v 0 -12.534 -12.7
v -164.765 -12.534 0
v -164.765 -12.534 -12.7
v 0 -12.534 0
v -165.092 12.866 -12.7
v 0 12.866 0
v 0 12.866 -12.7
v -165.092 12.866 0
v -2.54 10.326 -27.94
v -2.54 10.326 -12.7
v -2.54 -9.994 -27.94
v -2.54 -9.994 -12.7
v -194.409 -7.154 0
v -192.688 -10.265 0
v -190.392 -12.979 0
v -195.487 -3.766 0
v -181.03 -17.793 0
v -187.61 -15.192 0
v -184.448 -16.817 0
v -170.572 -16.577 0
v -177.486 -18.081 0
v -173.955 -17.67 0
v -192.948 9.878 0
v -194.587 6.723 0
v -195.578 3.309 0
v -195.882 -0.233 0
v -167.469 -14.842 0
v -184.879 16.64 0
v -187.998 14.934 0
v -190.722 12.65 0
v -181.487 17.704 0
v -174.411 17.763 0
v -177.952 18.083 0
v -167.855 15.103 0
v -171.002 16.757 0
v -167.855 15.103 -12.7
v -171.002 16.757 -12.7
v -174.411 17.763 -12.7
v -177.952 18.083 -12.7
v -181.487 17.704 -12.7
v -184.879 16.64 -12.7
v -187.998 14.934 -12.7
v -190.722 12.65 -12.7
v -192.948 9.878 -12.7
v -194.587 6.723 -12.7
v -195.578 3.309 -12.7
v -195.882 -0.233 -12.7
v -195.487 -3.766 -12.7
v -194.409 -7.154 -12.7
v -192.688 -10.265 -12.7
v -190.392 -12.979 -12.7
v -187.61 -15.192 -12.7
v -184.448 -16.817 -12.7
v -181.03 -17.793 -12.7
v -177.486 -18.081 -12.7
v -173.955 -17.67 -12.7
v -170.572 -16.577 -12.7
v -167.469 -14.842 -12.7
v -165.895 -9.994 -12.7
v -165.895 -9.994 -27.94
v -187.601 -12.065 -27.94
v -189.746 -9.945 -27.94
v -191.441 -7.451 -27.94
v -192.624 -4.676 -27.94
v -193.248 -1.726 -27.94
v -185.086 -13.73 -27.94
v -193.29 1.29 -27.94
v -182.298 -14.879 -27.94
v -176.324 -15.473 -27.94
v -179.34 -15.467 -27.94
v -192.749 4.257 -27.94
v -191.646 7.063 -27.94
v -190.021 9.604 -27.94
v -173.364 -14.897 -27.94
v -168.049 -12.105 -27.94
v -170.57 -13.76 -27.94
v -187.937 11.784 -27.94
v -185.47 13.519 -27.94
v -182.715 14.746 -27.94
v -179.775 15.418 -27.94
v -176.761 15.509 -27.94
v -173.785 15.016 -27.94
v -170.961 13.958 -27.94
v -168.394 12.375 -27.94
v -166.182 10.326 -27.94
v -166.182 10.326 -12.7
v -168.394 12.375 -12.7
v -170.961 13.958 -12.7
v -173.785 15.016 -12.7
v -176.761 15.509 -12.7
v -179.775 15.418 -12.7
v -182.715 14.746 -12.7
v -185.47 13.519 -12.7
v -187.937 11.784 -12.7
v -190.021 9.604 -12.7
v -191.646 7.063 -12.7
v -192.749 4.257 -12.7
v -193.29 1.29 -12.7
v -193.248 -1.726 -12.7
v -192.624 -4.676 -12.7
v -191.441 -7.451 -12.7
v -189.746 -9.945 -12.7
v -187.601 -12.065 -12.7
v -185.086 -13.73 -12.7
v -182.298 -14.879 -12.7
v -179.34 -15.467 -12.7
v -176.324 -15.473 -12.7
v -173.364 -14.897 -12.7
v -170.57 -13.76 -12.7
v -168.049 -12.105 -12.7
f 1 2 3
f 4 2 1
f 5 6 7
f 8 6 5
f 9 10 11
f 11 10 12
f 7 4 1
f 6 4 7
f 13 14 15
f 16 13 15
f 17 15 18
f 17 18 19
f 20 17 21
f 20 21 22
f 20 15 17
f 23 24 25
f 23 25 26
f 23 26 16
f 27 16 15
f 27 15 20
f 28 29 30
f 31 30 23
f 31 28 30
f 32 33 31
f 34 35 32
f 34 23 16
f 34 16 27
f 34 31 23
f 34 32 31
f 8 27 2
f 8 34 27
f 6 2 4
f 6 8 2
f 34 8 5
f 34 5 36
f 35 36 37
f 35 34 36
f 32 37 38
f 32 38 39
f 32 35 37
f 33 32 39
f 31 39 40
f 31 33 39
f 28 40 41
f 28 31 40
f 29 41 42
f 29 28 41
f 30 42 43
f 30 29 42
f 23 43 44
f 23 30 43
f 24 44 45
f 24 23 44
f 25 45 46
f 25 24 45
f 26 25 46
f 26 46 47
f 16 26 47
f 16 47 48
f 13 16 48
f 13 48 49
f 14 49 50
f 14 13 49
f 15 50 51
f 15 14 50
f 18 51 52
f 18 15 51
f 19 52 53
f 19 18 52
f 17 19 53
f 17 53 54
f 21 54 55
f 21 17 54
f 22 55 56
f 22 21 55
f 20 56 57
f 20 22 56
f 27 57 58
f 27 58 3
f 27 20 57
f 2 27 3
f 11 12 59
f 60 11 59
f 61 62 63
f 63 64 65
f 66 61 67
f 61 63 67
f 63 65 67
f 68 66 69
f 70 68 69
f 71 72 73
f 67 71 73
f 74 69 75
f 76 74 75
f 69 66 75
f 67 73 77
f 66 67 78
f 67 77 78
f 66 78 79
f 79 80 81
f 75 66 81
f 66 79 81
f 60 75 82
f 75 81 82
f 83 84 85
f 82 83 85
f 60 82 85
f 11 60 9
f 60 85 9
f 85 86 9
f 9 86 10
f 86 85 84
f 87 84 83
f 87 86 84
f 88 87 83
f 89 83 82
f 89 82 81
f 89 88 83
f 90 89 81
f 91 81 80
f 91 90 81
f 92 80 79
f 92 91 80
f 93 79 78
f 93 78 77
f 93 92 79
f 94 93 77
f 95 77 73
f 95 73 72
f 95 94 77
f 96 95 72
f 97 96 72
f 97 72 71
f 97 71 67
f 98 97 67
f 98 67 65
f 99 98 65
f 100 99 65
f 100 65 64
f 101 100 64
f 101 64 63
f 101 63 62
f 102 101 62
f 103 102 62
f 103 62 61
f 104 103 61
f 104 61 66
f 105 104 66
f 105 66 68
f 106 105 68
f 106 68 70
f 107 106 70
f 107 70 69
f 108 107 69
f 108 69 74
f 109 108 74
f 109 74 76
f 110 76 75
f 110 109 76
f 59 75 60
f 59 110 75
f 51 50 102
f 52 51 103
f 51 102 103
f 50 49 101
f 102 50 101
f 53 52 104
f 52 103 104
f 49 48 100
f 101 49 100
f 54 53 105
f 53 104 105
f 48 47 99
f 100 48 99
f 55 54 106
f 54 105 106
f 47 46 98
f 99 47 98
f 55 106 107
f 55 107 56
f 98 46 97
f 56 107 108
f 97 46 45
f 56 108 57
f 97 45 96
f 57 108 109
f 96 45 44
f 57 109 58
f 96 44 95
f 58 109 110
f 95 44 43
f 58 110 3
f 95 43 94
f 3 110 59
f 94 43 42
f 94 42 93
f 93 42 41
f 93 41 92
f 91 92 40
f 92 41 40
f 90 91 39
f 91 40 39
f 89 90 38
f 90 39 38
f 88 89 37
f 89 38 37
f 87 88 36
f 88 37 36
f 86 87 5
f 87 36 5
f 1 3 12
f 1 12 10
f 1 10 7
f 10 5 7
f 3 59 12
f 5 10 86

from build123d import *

# Parameters (mm, degrees)
F1_DEPTH = 12.7
F2_T     = -2.54
F4_DEPTH = 25.4


with BuildPart() as f1:
    # F0 (on Top) → F1 (new body)
    with BuildSketch(Plane.XY):
        with BuildLine():
            Line((0, -12.5342045865), (0, 12.8657954135))
            Line((0, 12.8657954135), (-165.0920747663, 12.8657954135))
            ThreePointArc((-165.0920747663, 12.8657954135), (-161.1142829028, 6.9718649096), (-159.7163041564, 0))
            ThreePointArc((-159.7163041564, 0), (-161.0258711618, -6.756378992), (-164.7649023499, -12.5342045865))
            Line((-164.7649023499, -12.5342045865), (0, -12.5342045865))
        make_face()
        with BuildLine():
            ThreePointArc((-159.7163041564, 0), (-161.1142829028, 6.9718649096), (-165.0920747663, 12.8657954135))
            Line((-165.0920747663, 12.8657954135), (-177.8, 12.8657954135))
            Line((-177.8, 12.8657954135), (-177.8, -12.5342045865))
            Line((-177.8, -12.5342045865), (-164.7649023499, -12.5342045865))
            ThreePointArc((-164.7649023499, -12.5342045865), (-161.0258711618, -6.756378992), (-159.7163041564, 0))
        make_face()
        with BuildLine():
            Line((-177.8, 12.8657954135), (-165.0920747663, 12.8657954135))
            ThreePointArc((-165.0920747663, 12.8657954135), (-195.8821958511, -0.232913217), (-164.7649023499, -12.5342045865))
            Line((-164.7649023499, -12.5342045865), (-177.8, -12.5342045865))
            Line((-177.8, -12.5342045865), (-177.8, 12.8657954135))
        make_face()
    extrude(amount=-F1_DEPTH)

    # F2
    f2_openings = [f1.faces().sort_by_distance(p)[0] for p in [
        (-100.144903, 0.13551, -12.7),
    ]]
    offset(amount=F2_T, openings=f2_openings, kind=Kind.INTERSECTION)

    # F4 (add): a face of the model
    f4_faces = [f1.faces().sort_by_distance(p)[0] for p in [
        (-100.8594782895, 0.1367235589, -2.54),
    ]]
    extrude(f4_faces, amount=F4_DEPTH)


solid = f1.part
